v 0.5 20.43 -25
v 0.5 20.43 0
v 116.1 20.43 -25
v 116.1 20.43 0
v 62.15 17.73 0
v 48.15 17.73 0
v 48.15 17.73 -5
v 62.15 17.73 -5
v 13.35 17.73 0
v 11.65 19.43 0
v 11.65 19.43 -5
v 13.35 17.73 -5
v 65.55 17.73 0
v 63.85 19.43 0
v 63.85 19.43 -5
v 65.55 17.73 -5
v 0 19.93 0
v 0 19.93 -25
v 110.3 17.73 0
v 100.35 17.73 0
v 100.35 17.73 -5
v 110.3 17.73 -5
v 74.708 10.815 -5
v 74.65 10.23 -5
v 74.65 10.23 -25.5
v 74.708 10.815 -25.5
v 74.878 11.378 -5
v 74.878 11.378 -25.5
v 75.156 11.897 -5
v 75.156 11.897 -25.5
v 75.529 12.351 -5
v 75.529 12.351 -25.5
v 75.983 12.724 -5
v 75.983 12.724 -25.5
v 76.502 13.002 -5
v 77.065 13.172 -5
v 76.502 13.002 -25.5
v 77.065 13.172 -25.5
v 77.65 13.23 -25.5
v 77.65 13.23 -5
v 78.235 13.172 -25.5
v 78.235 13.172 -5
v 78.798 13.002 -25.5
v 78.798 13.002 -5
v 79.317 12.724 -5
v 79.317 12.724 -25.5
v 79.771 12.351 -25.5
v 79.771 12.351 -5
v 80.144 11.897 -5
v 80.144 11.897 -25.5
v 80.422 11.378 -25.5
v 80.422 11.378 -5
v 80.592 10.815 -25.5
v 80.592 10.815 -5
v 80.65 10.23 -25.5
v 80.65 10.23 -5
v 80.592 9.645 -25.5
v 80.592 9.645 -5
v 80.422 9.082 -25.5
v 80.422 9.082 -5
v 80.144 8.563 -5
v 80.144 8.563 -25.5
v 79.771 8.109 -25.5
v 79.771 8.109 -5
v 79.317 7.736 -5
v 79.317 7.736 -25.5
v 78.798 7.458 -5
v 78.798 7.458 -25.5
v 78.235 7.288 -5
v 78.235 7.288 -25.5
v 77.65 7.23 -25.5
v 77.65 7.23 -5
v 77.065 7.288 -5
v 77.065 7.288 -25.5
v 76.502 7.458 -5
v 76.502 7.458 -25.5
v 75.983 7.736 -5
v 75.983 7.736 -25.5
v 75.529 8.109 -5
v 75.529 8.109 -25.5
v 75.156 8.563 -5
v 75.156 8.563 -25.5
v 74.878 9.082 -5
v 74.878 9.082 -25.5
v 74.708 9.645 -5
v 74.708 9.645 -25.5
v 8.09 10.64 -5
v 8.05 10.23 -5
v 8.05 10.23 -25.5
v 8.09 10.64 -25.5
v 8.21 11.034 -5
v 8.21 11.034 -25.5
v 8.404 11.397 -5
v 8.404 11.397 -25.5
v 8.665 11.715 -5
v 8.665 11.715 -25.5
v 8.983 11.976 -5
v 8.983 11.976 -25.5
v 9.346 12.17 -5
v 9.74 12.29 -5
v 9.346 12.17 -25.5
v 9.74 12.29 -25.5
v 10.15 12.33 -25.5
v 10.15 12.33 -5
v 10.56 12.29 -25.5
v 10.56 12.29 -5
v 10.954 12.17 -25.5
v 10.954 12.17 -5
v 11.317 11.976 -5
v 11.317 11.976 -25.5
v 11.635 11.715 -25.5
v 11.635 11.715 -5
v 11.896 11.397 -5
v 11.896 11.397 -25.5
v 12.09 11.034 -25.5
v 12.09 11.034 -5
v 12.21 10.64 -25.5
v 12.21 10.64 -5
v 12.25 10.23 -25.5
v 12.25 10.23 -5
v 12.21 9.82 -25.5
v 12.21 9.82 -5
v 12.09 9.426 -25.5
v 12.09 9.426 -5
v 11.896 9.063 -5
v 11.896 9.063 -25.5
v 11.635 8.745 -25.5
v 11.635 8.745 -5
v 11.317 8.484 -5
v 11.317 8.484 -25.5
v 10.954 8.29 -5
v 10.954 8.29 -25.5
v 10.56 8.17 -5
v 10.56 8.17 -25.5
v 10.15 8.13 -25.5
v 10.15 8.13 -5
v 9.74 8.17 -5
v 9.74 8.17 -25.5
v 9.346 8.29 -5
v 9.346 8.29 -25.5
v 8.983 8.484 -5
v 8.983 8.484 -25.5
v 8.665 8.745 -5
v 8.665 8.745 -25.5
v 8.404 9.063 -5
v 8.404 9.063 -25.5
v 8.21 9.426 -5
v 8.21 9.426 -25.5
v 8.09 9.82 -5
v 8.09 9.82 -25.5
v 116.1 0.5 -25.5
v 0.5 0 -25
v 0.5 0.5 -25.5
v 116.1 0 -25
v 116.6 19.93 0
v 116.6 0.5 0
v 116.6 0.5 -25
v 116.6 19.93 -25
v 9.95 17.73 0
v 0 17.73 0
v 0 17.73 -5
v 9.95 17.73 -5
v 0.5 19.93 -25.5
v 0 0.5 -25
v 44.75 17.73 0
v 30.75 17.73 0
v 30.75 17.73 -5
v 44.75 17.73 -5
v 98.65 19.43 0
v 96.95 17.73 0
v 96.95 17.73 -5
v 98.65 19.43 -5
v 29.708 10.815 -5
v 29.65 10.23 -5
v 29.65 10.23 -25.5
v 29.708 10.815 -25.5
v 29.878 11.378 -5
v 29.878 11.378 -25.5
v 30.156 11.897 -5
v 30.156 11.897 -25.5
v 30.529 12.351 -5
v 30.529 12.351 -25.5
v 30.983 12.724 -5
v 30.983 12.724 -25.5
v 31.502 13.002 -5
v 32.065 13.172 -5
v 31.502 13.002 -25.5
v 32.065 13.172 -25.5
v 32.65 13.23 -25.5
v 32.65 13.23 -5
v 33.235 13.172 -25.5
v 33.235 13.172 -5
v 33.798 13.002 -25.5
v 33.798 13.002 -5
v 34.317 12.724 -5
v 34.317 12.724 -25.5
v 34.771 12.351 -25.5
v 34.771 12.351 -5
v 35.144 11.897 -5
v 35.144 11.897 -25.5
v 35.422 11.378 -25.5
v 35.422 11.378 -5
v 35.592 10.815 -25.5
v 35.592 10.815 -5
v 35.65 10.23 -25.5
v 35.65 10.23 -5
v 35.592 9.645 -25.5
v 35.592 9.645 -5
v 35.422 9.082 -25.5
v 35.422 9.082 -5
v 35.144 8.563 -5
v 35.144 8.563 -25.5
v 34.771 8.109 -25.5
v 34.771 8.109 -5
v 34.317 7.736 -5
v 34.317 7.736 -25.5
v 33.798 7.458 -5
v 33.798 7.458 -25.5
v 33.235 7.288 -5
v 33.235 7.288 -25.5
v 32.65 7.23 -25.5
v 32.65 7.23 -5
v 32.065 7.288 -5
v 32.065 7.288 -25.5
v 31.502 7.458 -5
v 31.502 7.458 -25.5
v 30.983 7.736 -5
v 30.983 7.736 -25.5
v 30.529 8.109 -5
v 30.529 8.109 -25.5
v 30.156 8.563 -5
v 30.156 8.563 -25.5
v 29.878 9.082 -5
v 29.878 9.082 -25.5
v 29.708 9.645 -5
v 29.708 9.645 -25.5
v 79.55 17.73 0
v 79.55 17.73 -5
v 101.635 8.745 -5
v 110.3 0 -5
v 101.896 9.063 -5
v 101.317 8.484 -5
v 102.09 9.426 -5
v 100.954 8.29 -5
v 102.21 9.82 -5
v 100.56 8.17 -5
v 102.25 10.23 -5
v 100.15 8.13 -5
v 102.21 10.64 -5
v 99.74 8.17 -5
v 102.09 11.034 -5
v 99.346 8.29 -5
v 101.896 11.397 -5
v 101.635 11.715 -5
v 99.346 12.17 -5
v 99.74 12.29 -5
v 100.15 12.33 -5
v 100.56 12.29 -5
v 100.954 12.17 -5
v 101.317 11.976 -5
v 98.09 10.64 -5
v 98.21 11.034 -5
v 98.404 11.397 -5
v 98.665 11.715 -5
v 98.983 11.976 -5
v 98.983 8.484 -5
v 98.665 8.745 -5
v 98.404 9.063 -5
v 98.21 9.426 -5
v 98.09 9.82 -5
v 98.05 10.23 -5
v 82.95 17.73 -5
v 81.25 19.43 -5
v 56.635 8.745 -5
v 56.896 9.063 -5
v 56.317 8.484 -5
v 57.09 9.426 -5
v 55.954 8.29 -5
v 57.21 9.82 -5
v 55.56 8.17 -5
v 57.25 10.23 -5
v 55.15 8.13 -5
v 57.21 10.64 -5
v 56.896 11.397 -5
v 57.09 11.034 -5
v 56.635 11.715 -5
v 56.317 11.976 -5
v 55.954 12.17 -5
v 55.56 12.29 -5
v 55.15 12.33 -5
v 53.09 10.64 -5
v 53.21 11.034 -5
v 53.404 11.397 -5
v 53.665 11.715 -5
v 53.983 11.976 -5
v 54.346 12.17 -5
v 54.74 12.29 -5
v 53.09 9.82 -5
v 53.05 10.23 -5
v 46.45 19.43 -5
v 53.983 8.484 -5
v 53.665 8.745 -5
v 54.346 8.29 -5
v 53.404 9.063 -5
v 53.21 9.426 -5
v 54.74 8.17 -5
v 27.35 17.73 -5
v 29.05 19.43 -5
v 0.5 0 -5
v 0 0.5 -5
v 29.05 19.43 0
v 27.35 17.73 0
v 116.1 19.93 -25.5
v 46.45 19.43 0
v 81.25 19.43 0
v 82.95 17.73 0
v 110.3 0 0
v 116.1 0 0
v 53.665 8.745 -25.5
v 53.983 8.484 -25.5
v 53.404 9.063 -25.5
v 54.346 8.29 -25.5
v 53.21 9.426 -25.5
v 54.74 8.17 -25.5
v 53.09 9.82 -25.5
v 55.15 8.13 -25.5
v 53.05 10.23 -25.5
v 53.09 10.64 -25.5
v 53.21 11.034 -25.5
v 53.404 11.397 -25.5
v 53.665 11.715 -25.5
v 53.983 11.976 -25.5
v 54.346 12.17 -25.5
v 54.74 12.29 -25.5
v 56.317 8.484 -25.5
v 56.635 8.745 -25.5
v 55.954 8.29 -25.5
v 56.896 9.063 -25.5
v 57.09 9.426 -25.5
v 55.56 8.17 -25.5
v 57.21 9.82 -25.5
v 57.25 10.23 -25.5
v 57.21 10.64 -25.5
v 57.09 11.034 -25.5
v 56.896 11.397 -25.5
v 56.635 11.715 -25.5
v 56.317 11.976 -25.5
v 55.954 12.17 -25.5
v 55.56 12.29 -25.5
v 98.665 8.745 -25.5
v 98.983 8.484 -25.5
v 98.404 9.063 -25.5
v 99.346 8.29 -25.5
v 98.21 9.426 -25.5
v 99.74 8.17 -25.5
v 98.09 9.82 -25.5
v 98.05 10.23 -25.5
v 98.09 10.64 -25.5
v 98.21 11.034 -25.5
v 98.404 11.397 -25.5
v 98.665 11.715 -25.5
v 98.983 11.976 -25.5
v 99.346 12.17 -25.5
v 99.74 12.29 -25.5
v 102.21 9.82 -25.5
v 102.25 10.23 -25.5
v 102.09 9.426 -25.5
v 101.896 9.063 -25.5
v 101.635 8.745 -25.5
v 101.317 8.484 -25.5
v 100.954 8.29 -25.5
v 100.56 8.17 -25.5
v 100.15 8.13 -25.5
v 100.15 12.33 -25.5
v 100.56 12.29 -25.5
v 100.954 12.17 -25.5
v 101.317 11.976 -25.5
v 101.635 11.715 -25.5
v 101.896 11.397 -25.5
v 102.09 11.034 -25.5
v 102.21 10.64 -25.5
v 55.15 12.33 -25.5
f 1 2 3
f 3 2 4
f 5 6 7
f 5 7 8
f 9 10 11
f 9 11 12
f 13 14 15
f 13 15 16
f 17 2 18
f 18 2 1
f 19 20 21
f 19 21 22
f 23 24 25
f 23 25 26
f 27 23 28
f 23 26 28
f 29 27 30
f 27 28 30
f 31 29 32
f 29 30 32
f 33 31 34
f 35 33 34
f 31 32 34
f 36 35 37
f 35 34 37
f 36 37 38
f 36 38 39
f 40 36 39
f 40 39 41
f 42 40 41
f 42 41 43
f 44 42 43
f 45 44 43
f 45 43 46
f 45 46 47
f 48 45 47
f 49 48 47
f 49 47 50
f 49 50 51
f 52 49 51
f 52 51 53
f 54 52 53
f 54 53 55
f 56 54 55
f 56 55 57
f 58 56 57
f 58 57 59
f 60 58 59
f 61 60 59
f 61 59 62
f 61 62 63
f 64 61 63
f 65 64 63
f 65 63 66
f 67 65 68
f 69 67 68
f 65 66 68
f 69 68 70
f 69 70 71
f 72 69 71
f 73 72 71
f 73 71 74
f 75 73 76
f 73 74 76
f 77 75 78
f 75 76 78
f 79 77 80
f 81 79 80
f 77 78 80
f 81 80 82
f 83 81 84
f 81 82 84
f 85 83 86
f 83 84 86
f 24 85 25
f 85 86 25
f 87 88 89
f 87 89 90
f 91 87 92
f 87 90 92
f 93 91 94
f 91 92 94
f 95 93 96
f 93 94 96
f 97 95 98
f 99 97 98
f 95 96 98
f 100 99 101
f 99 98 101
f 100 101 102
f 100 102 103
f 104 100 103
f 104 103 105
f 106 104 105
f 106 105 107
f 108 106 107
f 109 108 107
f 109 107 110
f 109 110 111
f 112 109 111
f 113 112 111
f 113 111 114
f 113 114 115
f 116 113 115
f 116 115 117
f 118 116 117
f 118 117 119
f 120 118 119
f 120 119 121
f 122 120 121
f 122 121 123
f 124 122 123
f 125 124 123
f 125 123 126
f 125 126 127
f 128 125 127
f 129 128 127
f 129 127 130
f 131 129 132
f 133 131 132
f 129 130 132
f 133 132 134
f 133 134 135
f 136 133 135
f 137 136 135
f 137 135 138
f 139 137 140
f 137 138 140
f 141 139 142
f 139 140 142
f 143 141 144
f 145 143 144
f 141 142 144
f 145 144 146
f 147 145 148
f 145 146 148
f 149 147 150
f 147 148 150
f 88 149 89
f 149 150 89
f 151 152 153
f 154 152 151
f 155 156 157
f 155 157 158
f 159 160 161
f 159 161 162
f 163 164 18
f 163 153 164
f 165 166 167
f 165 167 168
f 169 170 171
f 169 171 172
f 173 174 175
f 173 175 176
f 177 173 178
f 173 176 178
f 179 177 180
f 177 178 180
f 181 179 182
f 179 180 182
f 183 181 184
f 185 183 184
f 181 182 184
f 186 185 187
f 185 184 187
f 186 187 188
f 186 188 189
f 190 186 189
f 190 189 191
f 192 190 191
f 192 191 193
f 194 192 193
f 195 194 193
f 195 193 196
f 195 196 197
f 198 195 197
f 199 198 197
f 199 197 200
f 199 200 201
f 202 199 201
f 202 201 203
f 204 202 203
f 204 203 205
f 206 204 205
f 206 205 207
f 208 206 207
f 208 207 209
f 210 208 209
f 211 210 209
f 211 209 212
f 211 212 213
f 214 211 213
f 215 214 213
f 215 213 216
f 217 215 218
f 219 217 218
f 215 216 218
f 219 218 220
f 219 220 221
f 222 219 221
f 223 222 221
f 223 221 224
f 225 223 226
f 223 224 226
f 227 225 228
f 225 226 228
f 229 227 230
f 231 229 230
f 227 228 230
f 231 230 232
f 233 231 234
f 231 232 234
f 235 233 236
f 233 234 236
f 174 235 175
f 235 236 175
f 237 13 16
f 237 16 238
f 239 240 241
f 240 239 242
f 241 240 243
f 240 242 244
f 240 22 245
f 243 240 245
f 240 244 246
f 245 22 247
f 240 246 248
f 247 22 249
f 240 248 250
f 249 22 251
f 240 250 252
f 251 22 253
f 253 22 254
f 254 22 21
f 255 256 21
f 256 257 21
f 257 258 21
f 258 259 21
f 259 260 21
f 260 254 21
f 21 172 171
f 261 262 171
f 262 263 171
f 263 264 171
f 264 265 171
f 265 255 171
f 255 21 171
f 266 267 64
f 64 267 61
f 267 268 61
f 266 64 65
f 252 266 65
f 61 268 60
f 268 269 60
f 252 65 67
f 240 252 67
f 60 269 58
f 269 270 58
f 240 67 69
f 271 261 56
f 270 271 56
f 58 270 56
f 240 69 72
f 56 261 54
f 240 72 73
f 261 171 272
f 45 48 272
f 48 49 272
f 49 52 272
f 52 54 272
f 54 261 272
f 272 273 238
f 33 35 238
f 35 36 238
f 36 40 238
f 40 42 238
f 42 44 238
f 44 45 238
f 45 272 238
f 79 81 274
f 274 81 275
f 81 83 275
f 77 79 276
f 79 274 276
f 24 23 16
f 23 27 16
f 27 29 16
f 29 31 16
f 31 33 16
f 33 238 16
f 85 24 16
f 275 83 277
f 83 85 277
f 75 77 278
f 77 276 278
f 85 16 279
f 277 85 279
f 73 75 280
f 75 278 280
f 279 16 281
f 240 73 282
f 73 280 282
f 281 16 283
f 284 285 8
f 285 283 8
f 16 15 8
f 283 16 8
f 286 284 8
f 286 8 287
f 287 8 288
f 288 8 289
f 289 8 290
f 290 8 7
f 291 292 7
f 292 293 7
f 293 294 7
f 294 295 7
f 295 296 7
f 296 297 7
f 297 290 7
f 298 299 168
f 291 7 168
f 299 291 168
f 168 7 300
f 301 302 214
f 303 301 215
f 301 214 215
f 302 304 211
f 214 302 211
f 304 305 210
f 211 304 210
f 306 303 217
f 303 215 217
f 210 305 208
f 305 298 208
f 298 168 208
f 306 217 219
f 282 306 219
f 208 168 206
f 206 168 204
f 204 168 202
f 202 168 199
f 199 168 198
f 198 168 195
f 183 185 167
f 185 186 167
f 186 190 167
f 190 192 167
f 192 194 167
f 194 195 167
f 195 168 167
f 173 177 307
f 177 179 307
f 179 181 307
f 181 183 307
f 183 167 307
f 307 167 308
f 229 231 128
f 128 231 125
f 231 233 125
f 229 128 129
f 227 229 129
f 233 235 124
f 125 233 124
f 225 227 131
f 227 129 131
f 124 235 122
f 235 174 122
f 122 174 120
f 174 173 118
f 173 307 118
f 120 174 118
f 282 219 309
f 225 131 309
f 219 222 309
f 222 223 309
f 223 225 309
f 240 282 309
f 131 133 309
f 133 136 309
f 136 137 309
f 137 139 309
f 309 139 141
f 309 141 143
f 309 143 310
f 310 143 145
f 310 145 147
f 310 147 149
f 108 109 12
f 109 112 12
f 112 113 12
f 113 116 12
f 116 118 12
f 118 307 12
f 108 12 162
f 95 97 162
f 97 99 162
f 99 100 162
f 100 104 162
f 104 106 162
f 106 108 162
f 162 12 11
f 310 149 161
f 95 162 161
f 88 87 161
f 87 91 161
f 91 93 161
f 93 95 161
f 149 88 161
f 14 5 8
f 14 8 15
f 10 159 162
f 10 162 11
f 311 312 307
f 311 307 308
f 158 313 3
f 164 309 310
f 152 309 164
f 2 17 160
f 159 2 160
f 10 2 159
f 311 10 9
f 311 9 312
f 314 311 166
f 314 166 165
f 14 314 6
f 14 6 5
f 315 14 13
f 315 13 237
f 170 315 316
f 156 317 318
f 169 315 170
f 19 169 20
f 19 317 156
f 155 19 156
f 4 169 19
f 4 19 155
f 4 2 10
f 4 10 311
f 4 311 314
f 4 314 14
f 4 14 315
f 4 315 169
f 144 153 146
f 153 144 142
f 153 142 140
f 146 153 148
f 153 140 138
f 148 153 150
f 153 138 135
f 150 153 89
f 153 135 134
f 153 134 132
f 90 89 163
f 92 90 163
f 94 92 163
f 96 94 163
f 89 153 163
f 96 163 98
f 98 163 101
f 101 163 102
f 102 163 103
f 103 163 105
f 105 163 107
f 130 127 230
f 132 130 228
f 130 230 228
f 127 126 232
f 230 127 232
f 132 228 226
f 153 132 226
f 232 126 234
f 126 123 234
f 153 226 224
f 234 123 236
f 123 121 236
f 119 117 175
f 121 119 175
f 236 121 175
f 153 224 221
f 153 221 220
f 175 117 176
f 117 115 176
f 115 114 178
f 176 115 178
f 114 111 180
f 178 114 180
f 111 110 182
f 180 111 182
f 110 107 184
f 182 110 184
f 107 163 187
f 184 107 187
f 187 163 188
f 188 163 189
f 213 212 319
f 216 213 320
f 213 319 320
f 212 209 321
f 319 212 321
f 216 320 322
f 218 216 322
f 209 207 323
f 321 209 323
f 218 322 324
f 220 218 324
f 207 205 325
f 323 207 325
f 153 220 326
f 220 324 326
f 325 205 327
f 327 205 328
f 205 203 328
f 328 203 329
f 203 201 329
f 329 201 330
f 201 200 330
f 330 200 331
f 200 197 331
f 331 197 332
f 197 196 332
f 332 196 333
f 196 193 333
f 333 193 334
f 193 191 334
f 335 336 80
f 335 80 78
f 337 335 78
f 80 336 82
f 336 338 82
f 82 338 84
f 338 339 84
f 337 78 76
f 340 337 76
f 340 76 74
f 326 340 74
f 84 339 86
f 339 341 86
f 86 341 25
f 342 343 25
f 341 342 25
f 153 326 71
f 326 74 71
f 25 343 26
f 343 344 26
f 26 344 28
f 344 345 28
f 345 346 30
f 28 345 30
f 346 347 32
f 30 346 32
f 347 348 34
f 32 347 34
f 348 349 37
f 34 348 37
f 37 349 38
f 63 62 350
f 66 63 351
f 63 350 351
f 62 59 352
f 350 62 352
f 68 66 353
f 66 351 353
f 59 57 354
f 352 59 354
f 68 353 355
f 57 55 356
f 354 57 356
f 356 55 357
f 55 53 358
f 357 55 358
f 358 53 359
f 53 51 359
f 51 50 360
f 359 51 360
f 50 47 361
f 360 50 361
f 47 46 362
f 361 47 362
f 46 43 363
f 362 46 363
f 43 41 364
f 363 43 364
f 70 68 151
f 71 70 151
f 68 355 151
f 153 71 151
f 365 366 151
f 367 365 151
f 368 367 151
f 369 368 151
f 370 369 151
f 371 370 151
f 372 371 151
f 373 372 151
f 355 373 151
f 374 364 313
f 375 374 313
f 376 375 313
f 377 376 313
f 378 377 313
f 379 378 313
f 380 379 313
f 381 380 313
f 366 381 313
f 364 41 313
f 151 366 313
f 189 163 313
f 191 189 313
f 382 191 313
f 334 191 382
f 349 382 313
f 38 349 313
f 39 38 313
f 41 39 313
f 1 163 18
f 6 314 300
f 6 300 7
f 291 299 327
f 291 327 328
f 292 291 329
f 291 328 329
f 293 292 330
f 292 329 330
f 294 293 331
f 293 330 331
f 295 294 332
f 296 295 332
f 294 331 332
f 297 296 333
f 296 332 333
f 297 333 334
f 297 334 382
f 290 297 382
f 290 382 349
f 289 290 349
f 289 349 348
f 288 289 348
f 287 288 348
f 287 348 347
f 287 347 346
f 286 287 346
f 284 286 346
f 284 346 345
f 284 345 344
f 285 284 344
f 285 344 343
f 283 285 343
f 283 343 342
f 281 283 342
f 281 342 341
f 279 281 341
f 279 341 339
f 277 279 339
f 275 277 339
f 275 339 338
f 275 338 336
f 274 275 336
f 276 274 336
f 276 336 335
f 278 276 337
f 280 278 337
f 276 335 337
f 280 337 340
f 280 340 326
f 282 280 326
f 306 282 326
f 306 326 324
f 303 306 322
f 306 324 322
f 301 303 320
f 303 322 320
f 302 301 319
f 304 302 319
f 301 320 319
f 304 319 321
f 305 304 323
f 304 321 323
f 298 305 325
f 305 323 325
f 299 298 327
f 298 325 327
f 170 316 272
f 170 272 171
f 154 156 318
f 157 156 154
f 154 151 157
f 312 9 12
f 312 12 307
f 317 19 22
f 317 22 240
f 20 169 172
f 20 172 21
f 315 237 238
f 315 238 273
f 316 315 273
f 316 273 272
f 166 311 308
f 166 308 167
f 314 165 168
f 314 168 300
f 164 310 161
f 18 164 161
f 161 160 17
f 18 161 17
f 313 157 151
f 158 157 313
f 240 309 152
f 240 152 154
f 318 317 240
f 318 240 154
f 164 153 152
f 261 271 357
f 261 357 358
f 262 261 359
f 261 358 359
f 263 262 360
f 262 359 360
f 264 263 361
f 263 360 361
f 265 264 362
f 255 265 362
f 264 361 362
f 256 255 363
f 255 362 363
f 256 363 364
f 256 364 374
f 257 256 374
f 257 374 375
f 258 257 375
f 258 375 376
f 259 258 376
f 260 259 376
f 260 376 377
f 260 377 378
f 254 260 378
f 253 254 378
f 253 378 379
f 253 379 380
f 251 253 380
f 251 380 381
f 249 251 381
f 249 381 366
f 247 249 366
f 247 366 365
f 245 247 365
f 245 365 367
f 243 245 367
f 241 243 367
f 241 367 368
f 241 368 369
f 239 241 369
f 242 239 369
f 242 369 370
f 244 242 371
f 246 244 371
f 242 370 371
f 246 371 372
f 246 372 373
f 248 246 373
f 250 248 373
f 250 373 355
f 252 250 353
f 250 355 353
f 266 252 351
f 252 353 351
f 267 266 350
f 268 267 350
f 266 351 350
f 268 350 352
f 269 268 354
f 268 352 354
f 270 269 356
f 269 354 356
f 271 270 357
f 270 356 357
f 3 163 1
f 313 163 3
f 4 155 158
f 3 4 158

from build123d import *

# Parameters (mm, degrees)
SKETCH_2_W          = 116.6
SKETCH_2_H          = 20.43
EXTRUDE_1_DEPTH     = 25.5
CUT_EXTRUDE_1_DEPTH = 5
M5X0_81_D           = 4.2
HOLE_WIZARD_6_0_1_D = 6
CHAMFER_1_SIZE      = 0.5


with BuildPart() as part:
    # Эскиз2 → Бобышка-Вытянуть1 (new body)
    with BuildSketch(Plane.XY):
        with Locations((58.3, 10.215)):
            Rectangle(SKETCH_2_W, SKETCH_2_H)
    extrude(amount=-EXTRUDE_1_DEPTH)

    # Эскиз1 → Вырез-Вытянуть1 (cut)
    with BuildSketch(Plane.XY):
        Polygon((27.35, 17.73), (29.05, 19.43), (30.75, 17.73), (44.75, 17.73), (46.45, 19.43), (48.15, 17.73), (62.15, 17.73), (63.85, 19.43), (65.55, 17.73), (79.55, 17.73), (81.25, 19.43), (82.95, 17.73), (96.95, 17.73), (98.65, 19.43), (100.35, 17.73), (110.3, 17.73), (110.3, 0), (0, 0), (0, 17.73), (9.95, 17.73), (11.65, 19.43), (13.35, 17.73), align=None)
    extrude(amount=-CUT_EXTRUDE_1_DEPTH, mode=Mode.SUBTRACT)

    # Отверстие обработанное метчиком M5x0.81 (through all)
    with Locations(Plane(origin=(-38.872854219, 5.478694599, -5), x_dir=(1, 0, 0), z_dir=(0, 0, 1))):
        with Locations((94.022854219, 4.751305401), (49.022854219, 4.751305401), (139.022854219, 4.751305401)):
            Hole(M5X0_81_D / 2)

    # Отверстия под штифты Ø6.0 мм1 (through all)
    with Locations(Plane.XY.offset(-5)):
        with Locations((32.65, 10.23), (77.65, 10.23)):
            Hole(HOLE_WIZARD_6_0_1_D / 2)

    # Фаска1
    chamfer_1_edges = [part.edges().sort_by_distance(p)[0] for p in [
        (116.6, 10.215, -25.5),
        (58.3, 20.43, -25.5),
        (0, 10.215, -25.5),
        (58.3, 0, -25.5),
        (0, 20.43, -12.75),
        (116.6, 20.43, -12.75),
        (116.6, 0, -12.75),
        (0, 0, -15.25),
    ]]
    chamfer(chamfer_1_edges, length=CHAMFER_1_SIZE)


solid = part.part
